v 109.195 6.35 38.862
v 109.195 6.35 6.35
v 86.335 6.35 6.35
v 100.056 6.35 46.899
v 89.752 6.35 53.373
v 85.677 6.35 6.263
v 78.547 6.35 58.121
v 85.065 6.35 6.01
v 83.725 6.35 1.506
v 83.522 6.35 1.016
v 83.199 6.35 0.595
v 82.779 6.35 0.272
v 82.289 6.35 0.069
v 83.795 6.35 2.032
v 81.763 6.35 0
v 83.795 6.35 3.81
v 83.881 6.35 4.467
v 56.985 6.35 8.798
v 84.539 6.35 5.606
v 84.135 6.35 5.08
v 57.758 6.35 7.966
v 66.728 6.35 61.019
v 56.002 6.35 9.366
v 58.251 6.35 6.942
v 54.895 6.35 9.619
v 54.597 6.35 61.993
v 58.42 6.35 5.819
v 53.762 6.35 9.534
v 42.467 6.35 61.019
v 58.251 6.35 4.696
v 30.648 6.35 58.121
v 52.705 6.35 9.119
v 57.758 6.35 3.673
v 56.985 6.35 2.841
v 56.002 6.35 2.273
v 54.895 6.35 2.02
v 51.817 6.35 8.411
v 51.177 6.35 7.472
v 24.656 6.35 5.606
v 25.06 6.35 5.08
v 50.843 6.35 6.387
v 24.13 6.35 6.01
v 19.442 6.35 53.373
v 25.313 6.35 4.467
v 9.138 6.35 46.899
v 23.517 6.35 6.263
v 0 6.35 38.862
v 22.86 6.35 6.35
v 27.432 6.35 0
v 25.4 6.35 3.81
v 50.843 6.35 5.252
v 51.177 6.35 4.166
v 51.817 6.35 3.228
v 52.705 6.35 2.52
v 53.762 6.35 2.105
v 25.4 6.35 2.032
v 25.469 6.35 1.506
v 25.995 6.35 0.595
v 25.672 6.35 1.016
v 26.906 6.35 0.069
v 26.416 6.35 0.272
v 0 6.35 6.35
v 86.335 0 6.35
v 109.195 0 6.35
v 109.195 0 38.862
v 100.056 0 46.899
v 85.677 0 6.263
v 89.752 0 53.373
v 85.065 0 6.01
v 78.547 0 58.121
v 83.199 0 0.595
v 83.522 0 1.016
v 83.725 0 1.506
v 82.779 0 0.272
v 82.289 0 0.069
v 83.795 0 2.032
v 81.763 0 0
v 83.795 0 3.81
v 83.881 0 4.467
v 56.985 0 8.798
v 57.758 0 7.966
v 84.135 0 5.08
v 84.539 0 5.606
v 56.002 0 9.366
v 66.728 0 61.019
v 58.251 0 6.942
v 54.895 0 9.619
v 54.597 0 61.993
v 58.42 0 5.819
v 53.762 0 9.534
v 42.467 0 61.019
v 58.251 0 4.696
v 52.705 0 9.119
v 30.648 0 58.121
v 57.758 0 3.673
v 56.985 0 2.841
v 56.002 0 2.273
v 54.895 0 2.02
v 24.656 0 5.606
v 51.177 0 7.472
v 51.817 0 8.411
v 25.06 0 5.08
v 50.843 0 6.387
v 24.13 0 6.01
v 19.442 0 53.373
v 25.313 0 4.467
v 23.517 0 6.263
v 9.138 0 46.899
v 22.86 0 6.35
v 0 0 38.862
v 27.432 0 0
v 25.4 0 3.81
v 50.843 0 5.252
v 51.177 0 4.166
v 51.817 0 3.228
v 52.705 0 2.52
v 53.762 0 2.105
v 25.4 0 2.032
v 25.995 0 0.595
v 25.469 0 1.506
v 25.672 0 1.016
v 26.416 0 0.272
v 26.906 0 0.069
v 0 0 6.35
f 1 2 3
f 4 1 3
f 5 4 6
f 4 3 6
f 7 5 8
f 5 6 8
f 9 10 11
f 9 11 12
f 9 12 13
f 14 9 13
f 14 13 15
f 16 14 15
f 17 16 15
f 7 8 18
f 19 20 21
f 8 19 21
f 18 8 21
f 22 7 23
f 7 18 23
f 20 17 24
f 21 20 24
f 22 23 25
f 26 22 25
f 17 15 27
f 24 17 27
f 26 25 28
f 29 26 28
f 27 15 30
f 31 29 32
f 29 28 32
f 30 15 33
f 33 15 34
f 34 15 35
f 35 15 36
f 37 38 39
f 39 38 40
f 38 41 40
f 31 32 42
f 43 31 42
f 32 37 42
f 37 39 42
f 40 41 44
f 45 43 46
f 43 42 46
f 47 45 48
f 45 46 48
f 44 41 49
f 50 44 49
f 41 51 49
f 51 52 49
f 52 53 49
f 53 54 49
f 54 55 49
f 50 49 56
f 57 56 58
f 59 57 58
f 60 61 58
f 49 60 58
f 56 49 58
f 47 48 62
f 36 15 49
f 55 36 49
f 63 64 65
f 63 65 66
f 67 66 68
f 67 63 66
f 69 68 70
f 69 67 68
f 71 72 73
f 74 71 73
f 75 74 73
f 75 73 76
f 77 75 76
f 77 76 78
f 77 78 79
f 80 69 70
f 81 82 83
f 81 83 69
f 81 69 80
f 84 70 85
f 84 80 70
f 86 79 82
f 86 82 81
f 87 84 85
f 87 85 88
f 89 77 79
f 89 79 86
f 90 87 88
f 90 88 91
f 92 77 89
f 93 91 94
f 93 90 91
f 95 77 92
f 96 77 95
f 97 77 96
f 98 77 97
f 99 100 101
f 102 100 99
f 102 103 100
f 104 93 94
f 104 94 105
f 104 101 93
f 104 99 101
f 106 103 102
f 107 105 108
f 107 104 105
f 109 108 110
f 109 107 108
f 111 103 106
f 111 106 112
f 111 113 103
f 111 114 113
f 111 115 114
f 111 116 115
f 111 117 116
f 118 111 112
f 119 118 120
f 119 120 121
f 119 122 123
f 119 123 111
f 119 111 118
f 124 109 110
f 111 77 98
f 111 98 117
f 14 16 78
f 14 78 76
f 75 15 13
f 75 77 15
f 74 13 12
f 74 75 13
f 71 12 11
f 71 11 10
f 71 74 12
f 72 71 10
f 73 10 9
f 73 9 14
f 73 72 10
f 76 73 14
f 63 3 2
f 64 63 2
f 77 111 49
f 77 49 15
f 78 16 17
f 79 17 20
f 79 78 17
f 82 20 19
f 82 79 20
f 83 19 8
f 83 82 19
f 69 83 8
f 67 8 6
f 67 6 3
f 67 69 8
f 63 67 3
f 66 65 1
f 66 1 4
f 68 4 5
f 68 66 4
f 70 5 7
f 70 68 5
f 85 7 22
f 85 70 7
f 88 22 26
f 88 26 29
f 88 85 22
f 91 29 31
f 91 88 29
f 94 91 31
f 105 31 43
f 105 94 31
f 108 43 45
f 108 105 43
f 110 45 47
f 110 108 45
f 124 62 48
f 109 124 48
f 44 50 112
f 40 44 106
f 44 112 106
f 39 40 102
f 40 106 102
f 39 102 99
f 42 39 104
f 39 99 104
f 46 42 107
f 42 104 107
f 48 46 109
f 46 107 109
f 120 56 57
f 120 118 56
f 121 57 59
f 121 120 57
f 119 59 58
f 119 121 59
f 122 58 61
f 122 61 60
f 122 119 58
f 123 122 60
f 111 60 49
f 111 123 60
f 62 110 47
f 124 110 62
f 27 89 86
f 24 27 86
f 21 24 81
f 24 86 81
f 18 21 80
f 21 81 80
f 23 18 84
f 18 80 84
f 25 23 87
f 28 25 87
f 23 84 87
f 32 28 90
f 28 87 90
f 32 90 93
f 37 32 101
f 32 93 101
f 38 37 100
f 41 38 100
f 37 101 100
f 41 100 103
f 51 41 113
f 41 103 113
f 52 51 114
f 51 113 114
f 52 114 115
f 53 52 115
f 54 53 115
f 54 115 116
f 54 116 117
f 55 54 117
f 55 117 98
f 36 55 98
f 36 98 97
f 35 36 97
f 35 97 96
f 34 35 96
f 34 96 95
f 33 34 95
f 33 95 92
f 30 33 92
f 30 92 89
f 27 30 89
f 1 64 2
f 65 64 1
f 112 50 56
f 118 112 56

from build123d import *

# Parameters (mm, degrees)
BOSS_EXTRUDE2_DEPTH = 6.35
SKETCH10_W          = 25.4
SKETCH10_H          = 6.35
CUT_EXTRUDE1_DEPTH  = 7.35
FILLET1_R           = 2.54
FILLET2_R           = 2.032
SKETCH11_R          = 3.81
CUT_EXTRUDE2_DEPTH  = 7.35


with BuildPart() as part:
    # Sketch6 → Boss-Extrude2 (new body)
    with BuildSketch(Plane(origin=(0, 0, 0), x_dir=(1, 0, 0), z_dir=(0, 1, 0))):
        with BuildLine():
            Line((0, 0), (109.1946, 0))
            Line((109.1946, 0), (109.1946, -38.862))
            ThreePointArc((109.1946, -38.862), (54.5973, -61.992965275), (0, -38.862))
            Line((0, -38.862), (0, 0))
        make_face()
    extrude(amount=BOSS_EXTRUDE2_DEPTH)

    # Sketch10 → Cut-Extrude1 (cut, through all)
    with BuildSketch(Plane(origin=(0, 6.35, 0), x_dir=(1, 0, 0), z_dir=(0, 1, 0))):
        with Locations((96.4946, -3.175)):
            Rectangle(SKETCH10_W, SKETCH10_H)
        with Locations((12.7, -3.175)):
            Rectangle(SKETCH10_W, SKETCH10_H)
    extrude(amount=-CUT_EXTRUDE1_DEPTH, mode=Mode.SUBTRACT)

    # Fillet1
    fillet1_edges = [part.edges().sort_by_distance(p)[0] for p in [
        (25.4, 3.175, 6.35),
        (83.7946, 3.175, 6.35),
    ]]
    fillet(fillet1_edges, radius=FILLET1_R)

    # Fillet2
    fillet2_edges = [part.edges().sort_by_distance(p)[0] for p in [
        (25.4, 3.175, 0),
        (83.7946, 3.175, 0),
    ]]
    fillet(fillet2_edges, radius=FILLET2_R)

    # Sketch11 → Cut-Extrude2 (cut, through all)
    with BuildSketch(Plane.XZ):
        with Locations((54.61, 5.819375203)):
            Circle(SKETCH11_R)
    extrude(amount=-CUT_EXTRUDE2_DEPTH, mode=Mode.SUBTRACT)


solid = part.part
